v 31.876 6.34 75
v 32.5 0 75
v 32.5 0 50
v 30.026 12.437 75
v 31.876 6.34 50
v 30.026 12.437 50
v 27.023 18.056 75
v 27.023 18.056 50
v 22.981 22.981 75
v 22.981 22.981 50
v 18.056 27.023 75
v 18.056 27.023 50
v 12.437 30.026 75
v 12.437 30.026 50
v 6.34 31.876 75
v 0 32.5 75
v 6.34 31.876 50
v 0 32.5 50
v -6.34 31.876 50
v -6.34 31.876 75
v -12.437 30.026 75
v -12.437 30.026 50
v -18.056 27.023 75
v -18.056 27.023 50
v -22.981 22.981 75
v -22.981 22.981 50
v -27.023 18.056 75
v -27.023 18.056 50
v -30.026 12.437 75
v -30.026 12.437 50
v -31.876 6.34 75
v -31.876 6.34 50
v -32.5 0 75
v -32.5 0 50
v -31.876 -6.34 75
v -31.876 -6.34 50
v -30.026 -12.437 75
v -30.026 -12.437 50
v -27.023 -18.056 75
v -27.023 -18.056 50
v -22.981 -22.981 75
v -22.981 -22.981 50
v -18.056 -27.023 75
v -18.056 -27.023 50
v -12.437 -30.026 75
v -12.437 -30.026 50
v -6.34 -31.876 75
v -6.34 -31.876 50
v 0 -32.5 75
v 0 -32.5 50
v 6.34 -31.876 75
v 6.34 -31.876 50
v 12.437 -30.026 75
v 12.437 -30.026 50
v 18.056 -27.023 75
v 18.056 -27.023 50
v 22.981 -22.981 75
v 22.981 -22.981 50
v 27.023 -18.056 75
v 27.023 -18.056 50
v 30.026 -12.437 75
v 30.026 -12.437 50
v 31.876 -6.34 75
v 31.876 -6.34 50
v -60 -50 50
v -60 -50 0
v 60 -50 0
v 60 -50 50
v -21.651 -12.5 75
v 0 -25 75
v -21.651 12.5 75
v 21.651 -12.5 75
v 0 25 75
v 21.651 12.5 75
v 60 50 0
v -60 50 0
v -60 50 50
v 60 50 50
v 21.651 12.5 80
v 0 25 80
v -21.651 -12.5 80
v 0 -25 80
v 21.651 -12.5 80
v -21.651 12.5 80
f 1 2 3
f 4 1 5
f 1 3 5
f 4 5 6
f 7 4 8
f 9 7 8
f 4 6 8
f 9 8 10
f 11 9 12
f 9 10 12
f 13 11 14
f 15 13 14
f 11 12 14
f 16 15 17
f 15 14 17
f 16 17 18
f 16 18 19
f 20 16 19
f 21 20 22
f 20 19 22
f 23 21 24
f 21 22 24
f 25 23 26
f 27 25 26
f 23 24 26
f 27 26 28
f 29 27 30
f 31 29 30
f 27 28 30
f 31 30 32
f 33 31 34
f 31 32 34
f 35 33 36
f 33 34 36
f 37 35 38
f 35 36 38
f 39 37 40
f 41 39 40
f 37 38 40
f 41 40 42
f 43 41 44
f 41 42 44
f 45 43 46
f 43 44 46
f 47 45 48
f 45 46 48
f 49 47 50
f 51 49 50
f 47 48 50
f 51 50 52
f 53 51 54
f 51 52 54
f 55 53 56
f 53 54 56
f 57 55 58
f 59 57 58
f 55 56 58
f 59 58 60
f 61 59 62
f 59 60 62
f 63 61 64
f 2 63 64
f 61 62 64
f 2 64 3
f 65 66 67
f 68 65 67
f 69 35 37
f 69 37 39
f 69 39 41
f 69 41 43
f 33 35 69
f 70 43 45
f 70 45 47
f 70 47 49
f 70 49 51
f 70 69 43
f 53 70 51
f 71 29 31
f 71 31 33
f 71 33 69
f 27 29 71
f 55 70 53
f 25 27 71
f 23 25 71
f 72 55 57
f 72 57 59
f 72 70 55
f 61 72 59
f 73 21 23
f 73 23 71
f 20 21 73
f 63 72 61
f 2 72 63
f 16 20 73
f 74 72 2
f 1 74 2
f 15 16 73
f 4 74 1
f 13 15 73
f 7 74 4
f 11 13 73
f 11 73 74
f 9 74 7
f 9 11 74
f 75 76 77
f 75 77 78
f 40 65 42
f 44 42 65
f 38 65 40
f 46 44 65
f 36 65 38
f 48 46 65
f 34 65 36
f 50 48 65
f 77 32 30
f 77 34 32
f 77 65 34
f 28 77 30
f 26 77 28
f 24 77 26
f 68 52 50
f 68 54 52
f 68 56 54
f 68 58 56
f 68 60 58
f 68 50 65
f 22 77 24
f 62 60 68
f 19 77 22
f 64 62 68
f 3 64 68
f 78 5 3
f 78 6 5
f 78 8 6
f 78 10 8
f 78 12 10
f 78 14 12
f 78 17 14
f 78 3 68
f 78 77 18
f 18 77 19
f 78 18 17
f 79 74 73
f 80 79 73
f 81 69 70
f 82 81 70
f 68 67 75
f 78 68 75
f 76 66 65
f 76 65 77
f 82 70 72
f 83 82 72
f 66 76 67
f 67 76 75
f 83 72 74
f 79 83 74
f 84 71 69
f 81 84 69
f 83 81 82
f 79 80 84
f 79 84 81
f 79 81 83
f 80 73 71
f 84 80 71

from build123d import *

# Parameters (mm, degrees)
F0_W     = 120
F0_H     = 100
F1_DEPTH = 50
F2_R     = 32.5
F3_DEPTH = 25
F5_DEPTH = 5


with BuildPart() as f1:
    # F0 (on Top) → F1 (new body)
    with BuildSketch(Plane.XY):
        Rectangle(F0_W, F0_H)
    extrude(amount=F1_DEPTH)

    # F2 (on face) → F3 (join)
    with BuildSketch(Plane.XY.offset(50)):
        Circle(F2_R)
    extrude(amount=F3_DEPTH)

    # F4 (on face) → F5 (join)
    with BuildSketch(Plane.XY.offset(75)):
        Polygon((-21.650635, -12.5), (0, -25), (21.650635, -12.5), (21.650635, 12.5), (0, 25), (-21.650635, 12.5), align=None)
    extrude(amount=F5_DEPTH)


solid = f1.part
